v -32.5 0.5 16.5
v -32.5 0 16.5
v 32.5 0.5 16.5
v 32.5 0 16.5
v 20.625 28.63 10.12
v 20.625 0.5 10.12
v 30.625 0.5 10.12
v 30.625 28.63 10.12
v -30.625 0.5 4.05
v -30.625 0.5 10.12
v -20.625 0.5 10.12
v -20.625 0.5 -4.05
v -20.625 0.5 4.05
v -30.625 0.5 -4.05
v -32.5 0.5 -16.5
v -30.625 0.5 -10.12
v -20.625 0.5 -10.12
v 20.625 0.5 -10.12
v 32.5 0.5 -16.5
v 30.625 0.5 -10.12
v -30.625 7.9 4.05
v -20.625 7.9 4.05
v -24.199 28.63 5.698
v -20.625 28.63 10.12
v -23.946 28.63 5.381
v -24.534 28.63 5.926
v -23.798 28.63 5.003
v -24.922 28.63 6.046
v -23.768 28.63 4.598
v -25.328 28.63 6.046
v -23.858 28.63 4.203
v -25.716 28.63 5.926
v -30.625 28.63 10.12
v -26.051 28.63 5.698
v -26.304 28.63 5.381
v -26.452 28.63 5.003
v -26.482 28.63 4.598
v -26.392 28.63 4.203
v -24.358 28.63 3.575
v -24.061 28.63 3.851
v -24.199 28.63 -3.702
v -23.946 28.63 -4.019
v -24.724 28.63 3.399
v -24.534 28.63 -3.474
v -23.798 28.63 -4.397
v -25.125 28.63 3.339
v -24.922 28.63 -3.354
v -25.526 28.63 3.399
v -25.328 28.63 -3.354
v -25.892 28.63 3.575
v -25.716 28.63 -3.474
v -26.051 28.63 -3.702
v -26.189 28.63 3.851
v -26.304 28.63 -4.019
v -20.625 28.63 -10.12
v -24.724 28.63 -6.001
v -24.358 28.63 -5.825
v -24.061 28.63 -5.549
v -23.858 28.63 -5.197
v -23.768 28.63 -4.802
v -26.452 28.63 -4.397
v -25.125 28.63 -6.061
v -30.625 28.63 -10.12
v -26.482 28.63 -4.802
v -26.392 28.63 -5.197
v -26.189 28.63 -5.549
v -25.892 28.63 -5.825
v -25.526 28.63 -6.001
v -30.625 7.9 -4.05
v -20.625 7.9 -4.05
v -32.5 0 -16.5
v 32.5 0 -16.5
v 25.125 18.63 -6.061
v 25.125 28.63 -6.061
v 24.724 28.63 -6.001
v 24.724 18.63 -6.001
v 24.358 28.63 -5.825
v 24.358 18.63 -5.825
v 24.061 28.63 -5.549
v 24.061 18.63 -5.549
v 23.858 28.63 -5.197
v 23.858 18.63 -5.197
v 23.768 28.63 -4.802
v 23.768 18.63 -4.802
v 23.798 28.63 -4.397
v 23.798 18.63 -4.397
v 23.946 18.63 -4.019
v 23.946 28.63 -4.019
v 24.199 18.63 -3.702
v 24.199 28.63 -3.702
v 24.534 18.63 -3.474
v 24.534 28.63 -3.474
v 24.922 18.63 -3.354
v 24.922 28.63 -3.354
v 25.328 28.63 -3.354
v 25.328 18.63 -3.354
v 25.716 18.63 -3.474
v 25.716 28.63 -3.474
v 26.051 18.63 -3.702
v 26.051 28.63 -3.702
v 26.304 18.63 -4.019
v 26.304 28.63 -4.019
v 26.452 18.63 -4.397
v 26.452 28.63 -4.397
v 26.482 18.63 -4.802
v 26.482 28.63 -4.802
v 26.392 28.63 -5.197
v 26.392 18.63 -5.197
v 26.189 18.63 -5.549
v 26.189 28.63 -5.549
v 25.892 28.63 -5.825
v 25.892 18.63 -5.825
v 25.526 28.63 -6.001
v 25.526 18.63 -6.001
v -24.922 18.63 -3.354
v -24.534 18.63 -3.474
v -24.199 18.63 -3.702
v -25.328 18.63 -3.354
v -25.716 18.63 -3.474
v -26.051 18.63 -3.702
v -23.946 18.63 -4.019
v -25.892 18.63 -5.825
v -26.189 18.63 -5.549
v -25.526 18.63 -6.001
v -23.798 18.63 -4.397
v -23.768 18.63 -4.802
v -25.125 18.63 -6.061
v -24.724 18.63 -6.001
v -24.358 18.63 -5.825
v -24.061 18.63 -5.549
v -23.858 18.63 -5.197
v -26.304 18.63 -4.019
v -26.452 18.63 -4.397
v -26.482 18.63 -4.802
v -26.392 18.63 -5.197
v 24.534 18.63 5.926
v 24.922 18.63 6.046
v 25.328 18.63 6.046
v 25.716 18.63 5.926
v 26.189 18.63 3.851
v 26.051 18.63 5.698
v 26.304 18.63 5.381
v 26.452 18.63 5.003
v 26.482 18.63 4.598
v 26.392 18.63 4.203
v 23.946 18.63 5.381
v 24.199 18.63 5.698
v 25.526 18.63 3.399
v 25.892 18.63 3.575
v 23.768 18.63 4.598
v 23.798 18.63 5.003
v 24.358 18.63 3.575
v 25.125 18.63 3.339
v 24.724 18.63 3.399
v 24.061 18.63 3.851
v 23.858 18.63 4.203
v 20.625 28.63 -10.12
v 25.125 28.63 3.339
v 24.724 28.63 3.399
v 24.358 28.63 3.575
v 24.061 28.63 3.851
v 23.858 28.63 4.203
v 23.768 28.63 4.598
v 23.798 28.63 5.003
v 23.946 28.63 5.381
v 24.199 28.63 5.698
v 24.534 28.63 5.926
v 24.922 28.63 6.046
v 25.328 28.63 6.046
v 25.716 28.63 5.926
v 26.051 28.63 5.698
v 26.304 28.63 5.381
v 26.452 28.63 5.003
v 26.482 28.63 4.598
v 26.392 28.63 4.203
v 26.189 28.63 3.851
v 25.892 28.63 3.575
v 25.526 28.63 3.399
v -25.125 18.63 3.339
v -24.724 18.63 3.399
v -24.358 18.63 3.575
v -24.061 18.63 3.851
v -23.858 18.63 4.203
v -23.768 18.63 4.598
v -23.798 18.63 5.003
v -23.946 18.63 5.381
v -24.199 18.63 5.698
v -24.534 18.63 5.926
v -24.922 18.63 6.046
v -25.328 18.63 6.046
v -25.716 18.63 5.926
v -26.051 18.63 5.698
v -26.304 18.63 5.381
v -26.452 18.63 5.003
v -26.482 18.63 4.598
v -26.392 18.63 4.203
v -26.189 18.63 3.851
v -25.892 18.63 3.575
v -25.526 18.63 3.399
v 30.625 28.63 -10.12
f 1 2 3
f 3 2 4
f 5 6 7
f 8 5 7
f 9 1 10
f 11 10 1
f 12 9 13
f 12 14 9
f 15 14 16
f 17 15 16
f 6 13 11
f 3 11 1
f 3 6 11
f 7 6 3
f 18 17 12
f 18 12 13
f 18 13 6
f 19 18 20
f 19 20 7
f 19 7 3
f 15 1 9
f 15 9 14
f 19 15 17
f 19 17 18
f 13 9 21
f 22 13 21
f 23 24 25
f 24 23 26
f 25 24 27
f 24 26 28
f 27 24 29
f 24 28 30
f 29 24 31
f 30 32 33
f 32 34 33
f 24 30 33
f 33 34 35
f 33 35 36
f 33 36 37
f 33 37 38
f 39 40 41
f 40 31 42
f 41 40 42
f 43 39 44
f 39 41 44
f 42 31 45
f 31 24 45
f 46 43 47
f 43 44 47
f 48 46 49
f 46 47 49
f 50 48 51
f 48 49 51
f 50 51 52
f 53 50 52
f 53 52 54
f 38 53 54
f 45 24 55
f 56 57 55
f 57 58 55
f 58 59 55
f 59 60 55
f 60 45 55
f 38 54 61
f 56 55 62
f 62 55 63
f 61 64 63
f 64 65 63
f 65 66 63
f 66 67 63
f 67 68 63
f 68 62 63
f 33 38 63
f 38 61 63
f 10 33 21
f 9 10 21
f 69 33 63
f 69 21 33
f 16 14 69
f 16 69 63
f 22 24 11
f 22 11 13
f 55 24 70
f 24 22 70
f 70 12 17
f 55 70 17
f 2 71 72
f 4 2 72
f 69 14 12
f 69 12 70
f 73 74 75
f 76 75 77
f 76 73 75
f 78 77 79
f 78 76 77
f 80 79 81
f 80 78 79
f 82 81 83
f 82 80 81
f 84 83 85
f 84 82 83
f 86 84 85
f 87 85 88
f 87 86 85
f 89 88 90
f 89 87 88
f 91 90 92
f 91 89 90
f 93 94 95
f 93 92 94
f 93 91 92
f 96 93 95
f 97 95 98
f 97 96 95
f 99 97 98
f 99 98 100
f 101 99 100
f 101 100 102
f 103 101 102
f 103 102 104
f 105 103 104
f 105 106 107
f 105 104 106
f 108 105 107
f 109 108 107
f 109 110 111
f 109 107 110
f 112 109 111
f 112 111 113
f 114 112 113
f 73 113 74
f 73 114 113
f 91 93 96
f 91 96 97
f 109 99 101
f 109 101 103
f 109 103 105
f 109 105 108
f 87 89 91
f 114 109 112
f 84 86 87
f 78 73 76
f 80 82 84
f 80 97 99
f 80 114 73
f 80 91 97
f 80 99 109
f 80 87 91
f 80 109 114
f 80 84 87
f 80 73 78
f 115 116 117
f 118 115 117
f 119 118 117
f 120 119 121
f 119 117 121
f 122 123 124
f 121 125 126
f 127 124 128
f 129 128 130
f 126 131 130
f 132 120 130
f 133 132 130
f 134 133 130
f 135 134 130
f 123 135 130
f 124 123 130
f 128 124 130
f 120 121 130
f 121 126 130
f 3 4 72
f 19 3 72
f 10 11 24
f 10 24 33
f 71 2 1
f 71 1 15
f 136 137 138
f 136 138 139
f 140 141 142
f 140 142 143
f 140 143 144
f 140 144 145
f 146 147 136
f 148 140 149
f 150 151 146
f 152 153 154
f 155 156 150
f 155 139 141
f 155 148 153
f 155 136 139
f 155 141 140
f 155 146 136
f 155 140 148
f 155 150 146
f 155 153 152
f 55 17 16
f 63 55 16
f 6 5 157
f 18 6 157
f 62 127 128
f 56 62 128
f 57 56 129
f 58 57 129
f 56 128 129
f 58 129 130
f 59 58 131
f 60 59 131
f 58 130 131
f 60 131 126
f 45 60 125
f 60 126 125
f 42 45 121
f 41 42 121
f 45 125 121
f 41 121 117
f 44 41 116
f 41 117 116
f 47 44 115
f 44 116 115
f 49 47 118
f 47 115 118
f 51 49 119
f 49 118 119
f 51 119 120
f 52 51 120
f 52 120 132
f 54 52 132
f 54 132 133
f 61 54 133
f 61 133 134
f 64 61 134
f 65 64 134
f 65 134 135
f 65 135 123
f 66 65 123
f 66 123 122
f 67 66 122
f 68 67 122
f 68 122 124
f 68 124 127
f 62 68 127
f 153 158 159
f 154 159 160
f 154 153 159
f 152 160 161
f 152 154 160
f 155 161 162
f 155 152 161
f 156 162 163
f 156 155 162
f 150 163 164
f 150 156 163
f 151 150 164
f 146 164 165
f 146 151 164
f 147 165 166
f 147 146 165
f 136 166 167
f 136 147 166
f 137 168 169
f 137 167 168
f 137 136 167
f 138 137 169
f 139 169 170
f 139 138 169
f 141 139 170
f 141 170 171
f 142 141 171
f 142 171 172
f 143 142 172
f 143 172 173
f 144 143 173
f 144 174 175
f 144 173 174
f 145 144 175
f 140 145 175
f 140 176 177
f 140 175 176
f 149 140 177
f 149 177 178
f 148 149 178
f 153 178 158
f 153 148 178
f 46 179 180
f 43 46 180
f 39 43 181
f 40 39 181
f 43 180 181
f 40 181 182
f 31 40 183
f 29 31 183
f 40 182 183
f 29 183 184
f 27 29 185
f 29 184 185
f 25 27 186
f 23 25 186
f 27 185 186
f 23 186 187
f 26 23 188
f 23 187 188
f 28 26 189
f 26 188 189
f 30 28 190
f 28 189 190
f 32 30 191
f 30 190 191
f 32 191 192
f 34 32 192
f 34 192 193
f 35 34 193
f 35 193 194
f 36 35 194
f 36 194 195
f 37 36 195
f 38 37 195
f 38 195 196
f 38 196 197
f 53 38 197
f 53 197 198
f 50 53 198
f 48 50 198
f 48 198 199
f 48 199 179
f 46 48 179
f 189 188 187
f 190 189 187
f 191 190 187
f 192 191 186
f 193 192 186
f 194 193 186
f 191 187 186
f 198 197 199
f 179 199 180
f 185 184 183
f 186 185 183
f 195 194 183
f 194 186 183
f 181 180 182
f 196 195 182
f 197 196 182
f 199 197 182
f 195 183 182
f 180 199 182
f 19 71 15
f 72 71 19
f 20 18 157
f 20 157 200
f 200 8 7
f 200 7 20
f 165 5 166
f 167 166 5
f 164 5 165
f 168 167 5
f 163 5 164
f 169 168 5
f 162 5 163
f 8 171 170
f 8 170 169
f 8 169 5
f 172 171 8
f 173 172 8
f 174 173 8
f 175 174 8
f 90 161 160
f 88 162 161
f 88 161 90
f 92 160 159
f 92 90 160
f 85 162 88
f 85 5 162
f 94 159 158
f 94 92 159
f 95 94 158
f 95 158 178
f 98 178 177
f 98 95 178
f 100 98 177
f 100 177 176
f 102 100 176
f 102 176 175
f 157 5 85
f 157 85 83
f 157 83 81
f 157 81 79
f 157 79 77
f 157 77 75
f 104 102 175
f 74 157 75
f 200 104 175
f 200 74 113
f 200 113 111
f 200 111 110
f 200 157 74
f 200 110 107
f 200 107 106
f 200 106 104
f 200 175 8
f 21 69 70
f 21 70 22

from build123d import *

# Parameters (mm, degrees)
SKETCH1_W           = 65
SKETCH1_H           = 33
BOSS_EXTRUDE1_DEPTH = 0.5
SKETCH2_W           = 10
SKETCH2_H           = 20.24
BOSS_EXTRUDE2_DEPTH = 28.13
CUT_EXTRUDE1_START  = -10
SKETCH3_R           = 1.361077795
CUT_EXTRUDE1_DEPTH  = 57.348429315
CUT_EXTRUDE2_REACH  = 73.251
SKETCH4_W           = 8.1
SKETCH4_H           = 7.4


with BuildPart() as part:
    # Sketch1 → Boss-Extrude1 (new body)
    with BuildSketch(Plane(origin=(0, 0, 0), x_dir=(1, 0, 0), z_dir=(0, 1, 0))):
        Rectangle(SKETCH1_W, SKETCH1_H)
    extrude(amount=BOSS_EXTRUDE1_DEPTH)

    # Sketch2 → Boss-Extrude2 (add)
    with BuildSketch(Plane(origin=(0, 0.5, 0), x_dir=(1, 0, 0), z_dir=(0, 1, 0))):
        with Locations((25.625, 0)):
            Rectangle(SKETCH2_W, SKETCH2_H)
    boss_extrude2 = extrude(amount=BOSS_EXTRUDE2_DEPTH)

    # Sketch3 → Cut-Extrude1 (cut)
    with BuildSketch(Plane(origin=(0, 28.63, 0), x_dir=(1, 0, 0), z_dir=(0, 1, 0)).offset(CUT_EXTRUDE1_START)):
        with Locations(Location((25.125, 4.7, 0), (0, 0, 90))):
            Circle(SKETCH3_R)
        with Locations(Location((25.125, -4.7, 0), (0, 0, 90))):
            Circle(SKETCH3_R)
    cut_extrude1 = extrude(amount=CUT_EXTRUDE1_DEPTH, mode=Mode.SUBTRACT)

    # Mirror3: Boss-Extrude2, Cut-Extrude1 across plane
    add(boss_extrude2.mirror(Plane(origin=(0, 0, 0), x_dir=(0, 0, 1), z_dir=(1, 0, 0))))
    add(cut_extrude1.mirror(Plane(origin=(0, 0, 0), x_dir=(0, 0, 1), z_dir=(1, 0, 0))), mode=Mode.SUBTRACT)

    # Sketch4 → Cut-Extrude2 (cut, up to next)
    with BuildSketch(Plane.ZY.offset(30.625), mode=Mode.PRIVATE) as cut_extrude2_sk1:
        with Locations((0, 4.2)):
            Rectangle(SKETCH4_W, SKETCH4_H)
    cut_extrude2_tool1 = extrude(cut_extrude2_sk1.sketch, amount=-CUT_EXTRUDE2_REACH, mode=Mode.PRIVATE) & part.part
    add(cut_extrude2_tool1.solids().sort_by_distance((-30.625, 4.2, 0))[0], mode=Mode.SUBTRACT)


solid = part.part
